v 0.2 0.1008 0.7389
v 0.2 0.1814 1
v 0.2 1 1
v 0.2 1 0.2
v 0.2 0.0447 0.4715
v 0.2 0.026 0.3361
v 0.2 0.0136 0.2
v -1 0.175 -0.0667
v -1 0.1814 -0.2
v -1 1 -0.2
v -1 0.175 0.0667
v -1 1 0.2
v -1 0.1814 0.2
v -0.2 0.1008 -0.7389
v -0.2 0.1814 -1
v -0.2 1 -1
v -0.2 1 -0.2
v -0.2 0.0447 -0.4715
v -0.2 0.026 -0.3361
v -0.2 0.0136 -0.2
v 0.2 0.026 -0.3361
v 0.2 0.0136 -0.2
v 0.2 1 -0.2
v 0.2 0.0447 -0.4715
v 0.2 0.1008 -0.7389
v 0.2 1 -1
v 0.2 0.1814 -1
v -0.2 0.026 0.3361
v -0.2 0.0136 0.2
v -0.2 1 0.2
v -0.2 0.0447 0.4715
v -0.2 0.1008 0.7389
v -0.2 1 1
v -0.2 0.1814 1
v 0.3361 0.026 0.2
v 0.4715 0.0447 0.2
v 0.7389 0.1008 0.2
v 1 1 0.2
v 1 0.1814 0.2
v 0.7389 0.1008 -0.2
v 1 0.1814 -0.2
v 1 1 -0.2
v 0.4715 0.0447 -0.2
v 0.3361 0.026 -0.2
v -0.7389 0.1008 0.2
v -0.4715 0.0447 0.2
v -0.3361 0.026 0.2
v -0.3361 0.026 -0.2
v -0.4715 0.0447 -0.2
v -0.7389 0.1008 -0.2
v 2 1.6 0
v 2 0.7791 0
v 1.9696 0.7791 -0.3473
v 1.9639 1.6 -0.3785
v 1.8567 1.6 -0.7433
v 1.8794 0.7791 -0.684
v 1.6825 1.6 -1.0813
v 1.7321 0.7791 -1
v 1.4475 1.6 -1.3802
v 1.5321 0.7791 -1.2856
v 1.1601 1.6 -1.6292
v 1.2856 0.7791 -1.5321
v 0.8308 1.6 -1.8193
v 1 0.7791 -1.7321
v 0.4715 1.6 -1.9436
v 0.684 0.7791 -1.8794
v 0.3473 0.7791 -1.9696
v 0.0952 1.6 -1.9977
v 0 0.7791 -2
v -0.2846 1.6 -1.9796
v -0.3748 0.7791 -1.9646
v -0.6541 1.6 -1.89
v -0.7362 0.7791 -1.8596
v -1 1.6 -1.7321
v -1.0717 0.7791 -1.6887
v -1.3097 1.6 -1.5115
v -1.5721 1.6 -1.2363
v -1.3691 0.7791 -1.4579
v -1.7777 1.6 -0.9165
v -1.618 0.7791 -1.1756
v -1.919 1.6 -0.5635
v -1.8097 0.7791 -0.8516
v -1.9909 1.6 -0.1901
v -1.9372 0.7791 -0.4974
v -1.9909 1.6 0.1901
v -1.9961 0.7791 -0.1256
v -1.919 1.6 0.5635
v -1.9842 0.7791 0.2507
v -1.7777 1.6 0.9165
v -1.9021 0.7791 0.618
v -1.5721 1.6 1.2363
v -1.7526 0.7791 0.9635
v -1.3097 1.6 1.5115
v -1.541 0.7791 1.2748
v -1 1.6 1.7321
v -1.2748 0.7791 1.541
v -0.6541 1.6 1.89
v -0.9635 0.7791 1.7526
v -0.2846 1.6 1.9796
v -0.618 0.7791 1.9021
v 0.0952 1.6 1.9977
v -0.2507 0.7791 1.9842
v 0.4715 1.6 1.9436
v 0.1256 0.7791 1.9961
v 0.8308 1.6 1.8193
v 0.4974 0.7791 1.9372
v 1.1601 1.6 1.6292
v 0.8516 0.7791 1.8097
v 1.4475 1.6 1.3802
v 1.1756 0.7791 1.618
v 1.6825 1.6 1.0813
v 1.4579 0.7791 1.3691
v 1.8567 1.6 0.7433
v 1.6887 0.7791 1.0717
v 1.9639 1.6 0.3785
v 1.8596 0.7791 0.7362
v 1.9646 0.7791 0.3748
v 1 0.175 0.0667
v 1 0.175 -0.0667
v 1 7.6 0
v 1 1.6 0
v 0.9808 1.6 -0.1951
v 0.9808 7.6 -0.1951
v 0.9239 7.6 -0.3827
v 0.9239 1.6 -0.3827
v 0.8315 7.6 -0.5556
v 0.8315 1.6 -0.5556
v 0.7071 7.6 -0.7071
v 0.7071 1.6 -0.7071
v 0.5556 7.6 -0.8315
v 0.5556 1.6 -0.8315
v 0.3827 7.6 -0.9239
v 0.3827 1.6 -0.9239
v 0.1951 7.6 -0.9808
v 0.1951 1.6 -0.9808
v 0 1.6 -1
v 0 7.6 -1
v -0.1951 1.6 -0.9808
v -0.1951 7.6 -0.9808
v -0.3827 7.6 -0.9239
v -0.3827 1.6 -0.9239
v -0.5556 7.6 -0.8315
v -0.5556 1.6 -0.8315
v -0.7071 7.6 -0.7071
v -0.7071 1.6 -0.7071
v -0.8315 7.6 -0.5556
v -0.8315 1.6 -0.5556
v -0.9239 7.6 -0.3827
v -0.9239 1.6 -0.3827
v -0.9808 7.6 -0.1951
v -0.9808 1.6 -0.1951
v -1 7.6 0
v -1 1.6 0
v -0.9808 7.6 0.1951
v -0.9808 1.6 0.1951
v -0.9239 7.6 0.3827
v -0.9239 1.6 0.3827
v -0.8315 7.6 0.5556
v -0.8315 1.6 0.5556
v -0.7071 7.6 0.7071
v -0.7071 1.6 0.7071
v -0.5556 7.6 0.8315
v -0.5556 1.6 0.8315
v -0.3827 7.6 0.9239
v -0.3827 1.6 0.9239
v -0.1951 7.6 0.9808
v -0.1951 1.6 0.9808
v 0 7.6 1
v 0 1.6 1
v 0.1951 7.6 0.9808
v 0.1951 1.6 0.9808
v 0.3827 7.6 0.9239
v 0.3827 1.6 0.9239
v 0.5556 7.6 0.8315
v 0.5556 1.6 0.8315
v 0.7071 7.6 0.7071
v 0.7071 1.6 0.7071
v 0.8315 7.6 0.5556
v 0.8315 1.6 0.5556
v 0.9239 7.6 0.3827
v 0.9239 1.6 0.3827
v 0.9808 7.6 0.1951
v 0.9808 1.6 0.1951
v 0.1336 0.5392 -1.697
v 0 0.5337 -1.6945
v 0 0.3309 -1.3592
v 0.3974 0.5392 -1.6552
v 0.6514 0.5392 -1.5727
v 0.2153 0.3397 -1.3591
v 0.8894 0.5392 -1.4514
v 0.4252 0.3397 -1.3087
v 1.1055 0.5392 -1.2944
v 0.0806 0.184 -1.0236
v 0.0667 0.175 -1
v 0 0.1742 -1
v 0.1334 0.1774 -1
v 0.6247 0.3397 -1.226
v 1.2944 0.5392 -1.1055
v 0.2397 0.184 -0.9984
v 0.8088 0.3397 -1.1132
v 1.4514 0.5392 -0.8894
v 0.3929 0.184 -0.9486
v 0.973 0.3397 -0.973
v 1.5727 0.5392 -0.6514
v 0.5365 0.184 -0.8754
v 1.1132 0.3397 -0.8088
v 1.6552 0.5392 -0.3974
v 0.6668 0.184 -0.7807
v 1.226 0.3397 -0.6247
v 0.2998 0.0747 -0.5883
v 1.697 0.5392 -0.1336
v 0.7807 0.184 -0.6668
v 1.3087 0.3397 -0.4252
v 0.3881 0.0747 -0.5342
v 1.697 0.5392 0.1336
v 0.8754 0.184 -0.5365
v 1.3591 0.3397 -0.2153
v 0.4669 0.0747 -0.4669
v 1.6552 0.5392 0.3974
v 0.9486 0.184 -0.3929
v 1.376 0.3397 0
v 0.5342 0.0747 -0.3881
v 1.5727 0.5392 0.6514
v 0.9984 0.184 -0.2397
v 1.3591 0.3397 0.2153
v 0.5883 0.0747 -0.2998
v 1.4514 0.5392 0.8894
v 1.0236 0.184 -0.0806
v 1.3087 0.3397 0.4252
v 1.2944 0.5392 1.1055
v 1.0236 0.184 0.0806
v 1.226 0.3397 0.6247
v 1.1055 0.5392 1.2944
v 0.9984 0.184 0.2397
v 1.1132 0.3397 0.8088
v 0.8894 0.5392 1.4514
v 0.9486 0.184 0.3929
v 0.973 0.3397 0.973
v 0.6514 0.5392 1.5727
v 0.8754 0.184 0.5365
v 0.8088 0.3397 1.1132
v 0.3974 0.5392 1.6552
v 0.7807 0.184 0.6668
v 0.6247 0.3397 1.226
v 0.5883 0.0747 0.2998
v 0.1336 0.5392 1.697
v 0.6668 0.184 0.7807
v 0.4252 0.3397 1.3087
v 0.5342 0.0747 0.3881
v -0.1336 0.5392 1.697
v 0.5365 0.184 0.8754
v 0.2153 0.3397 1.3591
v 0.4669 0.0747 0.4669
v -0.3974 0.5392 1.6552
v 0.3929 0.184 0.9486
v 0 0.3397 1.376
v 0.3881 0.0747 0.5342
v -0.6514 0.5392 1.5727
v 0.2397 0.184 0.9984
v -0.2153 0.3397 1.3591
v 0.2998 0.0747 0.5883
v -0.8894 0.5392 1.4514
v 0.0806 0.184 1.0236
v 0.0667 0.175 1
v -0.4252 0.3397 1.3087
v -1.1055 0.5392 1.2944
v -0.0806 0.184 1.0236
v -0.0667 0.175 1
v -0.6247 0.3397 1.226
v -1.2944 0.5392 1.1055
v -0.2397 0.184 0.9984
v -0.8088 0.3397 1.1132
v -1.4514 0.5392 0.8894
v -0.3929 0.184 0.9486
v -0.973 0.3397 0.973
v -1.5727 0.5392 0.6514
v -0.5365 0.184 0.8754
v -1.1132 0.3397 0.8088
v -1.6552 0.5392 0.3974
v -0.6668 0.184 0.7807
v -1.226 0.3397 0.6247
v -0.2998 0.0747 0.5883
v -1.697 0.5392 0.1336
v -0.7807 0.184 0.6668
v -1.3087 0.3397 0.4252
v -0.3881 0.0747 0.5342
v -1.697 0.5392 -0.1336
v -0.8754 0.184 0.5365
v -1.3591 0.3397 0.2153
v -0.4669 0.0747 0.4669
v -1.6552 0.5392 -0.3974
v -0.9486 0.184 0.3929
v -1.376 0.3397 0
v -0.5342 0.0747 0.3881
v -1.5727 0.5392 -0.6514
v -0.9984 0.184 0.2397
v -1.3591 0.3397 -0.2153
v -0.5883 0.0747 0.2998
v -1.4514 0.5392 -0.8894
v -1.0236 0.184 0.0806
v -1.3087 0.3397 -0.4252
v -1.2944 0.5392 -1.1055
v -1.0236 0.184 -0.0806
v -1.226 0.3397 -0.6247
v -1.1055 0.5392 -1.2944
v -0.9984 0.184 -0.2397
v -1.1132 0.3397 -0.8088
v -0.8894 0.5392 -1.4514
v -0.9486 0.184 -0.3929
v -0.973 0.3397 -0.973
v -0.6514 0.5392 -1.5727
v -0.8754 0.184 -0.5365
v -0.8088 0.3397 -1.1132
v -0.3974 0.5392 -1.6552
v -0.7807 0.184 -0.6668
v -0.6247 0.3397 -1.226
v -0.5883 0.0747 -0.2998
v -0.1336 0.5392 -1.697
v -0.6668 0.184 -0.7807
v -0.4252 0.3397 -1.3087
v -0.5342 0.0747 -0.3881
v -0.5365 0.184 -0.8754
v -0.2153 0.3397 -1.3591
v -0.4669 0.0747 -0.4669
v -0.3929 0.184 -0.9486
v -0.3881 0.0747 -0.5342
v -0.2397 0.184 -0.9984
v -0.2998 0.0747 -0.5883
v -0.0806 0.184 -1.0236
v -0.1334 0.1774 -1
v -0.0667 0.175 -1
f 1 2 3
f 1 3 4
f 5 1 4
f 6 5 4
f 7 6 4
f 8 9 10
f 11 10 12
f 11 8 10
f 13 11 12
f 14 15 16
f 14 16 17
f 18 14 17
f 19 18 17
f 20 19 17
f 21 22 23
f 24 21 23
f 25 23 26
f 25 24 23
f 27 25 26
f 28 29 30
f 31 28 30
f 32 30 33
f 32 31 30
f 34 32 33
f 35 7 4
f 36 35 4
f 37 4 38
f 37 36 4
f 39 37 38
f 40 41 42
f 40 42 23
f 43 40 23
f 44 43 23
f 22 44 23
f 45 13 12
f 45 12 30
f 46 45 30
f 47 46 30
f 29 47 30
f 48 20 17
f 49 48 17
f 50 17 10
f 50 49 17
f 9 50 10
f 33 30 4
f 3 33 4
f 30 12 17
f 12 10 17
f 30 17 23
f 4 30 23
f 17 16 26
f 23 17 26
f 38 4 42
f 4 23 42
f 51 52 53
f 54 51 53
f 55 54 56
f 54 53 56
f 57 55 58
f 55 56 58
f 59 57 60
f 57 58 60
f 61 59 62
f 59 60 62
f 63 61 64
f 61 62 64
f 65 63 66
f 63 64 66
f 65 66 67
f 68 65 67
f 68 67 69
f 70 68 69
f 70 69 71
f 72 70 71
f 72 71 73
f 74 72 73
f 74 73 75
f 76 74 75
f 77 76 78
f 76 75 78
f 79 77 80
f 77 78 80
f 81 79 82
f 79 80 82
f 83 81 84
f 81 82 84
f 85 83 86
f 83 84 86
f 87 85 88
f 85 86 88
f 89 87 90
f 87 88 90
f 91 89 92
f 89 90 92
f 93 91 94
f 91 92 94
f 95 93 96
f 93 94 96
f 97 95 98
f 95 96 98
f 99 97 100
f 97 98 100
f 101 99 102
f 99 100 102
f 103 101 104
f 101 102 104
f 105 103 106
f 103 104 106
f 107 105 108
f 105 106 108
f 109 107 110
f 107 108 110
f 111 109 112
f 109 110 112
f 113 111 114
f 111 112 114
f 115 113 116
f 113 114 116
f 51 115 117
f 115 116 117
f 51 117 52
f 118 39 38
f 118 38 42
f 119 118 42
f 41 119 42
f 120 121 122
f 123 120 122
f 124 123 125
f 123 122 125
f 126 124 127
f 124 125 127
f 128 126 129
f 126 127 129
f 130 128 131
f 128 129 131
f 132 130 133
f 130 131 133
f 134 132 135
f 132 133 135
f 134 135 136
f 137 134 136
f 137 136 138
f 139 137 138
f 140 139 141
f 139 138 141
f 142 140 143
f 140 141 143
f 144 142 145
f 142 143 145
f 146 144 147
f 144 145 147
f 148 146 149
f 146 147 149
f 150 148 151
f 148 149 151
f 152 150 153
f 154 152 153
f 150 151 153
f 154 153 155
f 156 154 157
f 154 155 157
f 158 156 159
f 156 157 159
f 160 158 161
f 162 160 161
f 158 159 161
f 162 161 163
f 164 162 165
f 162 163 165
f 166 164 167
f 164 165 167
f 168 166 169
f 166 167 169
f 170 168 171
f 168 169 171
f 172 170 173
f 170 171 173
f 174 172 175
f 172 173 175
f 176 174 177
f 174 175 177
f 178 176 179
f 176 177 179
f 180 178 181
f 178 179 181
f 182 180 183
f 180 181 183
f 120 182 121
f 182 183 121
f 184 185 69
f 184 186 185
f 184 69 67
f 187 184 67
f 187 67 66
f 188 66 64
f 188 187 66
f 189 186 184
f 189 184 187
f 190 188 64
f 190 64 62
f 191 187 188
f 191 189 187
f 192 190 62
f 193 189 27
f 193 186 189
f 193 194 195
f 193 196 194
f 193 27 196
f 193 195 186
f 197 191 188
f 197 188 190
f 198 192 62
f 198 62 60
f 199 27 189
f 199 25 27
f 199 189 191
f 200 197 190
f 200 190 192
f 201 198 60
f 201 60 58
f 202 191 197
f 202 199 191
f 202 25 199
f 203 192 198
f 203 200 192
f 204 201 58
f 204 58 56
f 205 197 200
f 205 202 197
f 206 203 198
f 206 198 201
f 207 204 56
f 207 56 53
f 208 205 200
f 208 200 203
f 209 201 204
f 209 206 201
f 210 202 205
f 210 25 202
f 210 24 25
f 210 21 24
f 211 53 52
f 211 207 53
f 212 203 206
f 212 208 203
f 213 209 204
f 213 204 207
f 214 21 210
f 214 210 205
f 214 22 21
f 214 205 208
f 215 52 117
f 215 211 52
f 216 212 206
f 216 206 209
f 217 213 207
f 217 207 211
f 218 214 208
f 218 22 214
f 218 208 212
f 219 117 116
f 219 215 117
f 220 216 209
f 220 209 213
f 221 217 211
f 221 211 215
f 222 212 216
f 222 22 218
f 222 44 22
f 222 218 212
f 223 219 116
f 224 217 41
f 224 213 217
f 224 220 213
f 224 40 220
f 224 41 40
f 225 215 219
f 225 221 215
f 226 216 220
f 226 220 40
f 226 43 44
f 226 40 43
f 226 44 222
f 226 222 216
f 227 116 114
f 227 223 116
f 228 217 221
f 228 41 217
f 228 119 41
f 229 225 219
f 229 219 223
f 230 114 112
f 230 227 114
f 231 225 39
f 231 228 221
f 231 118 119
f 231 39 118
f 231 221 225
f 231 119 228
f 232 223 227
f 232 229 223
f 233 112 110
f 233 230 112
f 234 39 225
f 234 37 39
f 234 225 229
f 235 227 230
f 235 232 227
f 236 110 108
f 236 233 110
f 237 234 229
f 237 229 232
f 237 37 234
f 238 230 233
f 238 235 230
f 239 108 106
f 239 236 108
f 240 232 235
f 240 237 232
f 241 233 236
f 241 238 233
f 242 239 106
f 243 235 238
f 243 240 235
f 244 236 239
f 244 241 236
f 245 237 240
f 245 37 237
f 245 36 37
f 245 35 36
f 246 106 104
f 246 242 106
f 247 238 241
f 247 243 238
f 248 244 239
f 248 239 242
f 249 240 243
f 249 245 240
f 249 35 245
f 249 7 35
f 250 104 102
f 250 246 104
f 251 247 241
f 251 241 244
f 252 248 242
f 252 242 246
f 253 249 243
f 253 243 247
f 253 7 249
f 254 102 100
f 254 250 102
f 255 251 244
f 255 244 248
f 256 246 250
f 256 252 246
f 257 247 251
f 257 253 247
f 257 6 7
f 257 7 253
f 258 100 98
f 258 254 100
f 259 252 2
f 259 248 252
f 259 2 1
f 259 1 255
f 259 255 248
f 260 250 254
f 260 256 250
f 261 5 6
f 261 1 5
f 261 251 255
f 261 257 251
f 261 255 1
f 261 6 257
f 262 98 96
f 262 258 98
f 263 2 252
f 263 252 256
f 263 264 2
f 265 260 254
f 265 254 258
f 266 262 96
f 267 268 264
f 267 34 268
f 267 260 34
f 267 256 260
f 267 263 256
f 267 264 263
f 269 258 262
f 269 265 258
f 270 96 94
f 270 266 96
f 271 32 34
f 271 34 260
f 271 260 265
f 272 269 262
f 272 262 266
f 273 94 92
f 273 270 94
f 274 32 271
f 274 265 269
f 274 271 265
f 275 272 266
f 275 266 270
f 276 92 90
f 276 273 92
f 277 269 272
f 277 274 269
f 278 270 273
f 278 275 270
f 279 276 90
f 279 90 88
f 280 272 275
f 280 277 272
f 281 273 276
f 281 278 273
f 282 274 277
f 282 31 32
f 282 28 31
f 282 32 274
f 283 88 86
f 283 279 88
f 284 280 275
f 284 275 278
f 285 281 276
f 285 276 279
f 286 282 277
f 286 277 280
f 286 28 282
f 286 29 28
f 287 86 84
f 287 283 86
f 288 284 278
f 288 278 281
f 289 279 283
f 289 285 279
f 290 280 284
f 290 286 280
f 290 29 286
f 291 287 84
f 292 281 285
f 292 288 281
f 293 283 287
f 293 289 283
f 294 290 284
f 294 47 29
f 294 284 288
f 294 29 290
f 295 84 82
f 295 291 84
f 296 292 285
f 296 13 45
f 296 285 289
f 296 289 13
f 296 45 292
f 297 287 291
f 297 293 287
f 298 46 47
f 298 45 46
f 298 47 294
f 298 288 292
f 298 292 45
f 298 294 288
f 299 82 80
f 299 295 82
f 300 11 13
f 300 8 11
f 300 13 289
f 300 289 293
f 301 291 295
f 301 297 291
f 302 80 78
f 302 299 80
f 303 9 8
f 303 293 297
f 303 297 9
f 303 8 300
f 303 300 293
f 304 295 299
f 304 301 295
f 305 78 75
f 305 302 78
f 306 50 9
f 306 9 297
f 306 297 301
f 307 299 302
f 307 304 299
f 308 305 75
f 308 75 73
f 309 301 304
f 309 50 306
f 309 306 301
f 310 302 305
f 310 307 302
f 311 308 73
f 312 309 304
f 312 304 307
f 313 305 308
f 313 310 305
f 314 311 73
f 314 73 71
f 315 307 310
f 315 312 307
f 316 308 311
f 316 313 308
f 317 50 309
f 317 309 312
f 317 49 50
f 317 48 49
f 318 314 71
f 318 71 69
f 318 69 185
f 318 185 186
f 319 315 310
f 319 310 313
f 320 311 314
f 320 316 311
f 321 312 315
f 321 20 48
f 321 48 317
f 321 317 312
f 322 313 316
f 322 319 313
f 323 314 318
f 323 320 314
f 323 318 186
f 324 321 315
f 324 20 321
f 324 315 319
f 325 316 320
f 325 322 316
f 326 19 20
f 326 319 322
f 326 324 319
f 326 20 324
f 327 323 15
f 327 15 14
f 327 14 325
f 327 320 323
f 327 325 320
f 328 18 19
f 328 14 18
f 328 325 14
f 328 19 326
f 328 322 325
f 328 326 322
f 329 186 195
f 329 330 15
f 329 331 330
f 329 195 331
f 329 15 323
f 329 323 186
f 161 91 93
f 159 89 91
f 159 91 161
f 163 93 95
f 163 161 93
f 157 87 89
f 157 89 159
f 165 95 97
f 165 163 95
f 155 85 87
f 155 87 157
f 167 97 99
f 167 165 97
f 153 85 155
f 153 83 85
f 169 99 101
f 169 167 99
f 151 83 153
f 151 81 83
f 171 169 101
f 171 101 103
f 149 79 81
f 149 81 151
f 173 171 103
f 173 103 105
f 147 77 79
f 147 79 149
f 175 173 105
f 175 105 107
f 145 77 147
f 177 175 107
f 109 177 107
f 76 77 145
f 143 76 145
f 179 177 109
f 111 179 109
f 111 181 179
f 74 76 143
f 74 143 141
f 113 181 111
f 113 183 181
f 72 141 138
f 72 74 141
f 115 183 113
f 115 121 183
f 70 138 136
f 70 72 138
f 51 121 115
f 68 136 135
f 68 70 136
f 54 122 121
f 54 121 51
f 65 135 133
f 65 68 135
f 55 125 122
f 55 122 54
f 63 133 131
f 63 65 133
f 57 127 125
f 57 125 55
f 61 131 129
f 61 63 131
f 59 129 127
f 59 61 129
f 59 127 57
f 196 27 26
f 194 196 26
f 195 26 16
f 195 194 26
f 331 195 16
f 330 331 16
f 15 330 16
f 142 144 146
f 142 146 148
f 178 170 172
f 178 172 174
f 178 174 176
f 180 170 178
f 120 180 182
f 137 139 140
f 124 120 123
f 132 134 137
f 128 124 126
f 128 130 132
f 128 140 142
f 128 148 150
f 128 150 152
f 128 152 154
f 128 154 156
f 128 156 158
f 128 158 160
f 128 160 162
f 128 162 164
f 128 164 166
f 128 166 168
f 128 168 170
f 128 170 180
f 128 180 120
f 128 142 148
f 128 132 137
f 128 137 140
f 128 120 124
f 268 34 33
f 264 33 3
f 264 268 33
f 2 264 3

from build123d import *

# Parameters (mm, degrees)
SKETCH_1_R          = 2
EXTRUDE_1_DEPTH     = 1.6
SKETCH_2_R          = 1
EXTRUDE_2_DEPTH     = 6
CUT_EXTRUDE_1_DEPTH = 6


with BuildPart() as part:
    # 草图1 → 凸台-拉伸1 (new body)
    with BuildSketch(Plane(origin=(0, 0, 0), x_dir=(1, 0, 0), z_dir=(0, 1, 0))):
        Circle(SKETCH_1_R)
    extrude(amount=EXTRUDE_1_DEPTH)

    # 草图2 → 凸台-拉伸2 (add)
    with BuildSketch(Plane(origin=(0, 1.6, 0), x_dir=(1, 0, 0), z_dir=(0, 1, 0))):
        Circle(SKETCH_2_R)
    extrude(amount=EXTRUDE_2_DEPTH)

    # 草图3 one side → 切除-旋转3 (revolve, cut)
    with BuildSketch(Plane(origin=(0, 0, 0), x_dir=(0, 0, -1), z_dir=(1, 0, 0))):
        with BuildLine():
            ThreePointArc((2, 0.779106216), (1.073196918, 0.201653394), (0, 0))
            Line((0, 0), (0, -0.936416285))
            Line((0, -0.936416285), (3.543500435, -0.936416285))
            Line((3.543500435, -0.936416285), (2, 0.779106216))
        make_face()
    revolve(axis=Axis((0, 1.035939113, 0), (0, -1, 0)), mode=Mode.SUBTRACT)

    # 草图4 → 切除-拉伸1 (cut)
    with BuildSketch(Plane(origin=(0, -5, 0), x_dir=(1, 0, 0), z_dir=(0, 1, 0))):
        Polygon((-1, -0.2), (-0.2, -0.2), (-0.2, -1), (0.2, -1), (0.2, -0.2), (1, -0.2), (1, 0.2), (0.2, 0.2), (0.2, 1), (-0.2, 1), (-0.2, 0.2), (-1, 0.2), align=None)
    extrude(amount=CUT_EXTRUDE_1_DEPTH, mode=Mode.SUBTRACT)


solid = part.part
